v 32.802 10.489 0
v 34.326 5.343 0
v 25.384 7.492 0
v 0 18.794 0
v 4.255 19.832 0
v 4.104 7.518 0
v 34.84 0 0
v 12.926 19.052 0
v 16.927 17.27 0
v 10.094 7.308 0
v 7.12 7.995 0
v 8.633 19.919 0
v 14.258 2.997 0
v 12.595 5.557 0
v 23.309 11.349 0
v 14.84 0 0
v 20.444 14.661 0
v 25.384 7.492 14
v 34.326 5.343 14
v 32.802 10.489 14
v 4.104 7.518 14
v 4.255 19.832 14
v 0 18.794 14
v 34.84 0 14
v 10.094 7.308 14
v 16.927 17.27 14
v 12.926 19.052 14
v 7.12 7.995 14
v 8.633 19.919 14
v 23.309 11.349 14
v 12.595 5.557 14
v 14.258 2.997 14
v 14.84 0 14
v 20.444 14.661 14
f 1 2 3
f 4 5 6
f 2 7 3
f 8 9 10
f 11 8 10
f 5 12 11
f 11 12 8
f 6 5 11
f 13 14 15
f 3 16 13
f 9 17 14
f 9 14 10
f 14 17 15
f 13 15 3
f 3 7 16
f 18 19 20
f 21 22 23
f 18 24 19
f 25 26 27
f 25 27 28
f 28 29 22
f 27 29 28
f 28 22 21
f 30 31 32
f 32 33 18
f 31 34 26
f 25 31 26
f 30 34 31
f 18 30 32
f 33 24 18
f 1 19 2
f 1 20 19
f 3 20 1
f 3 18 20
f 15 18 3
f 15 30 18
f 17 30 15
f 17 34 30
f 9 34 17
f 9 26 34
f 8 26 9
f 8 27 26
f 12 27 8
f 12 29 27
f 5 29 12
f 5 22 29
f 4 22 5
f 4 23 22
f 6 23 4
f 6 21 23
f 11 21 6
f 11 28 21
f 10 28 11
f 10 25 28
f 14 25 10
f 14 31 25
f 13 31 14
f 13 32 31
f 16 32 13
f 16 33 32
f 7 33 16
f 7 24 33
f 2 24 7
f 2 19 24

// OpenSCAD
$fn = 32;

// ----------------------------------------------------------------------
// Arc stop: segment, 14 mm thick
// ----------------------------------------------------------------------

// --- parameters (mm) ---
profile_height = 14;      // extrusion height
profile_points = 17;      // points of the closed outline

profile = [[34.84, 0], [34.326, 5.343], [32.802, 10.489], [25.384, 7.492], [23.309, 11.349], [20.444, 14.661], [16.927, 17.27], [12.926, 19.052], [8.633, 19.919], [4.255, 19.832], [0, 18.794], [4.104, 7.518], [7.12, 7.995], [10.094, 7.308], [12.595, 5.557], [14.258, 2.997], [14.84, 0]];  // single closed polygon, 17 points, counter clockwise

// --- the one profile operation ---
linear_extrude(height = profile_height) polygon(points = profile);
